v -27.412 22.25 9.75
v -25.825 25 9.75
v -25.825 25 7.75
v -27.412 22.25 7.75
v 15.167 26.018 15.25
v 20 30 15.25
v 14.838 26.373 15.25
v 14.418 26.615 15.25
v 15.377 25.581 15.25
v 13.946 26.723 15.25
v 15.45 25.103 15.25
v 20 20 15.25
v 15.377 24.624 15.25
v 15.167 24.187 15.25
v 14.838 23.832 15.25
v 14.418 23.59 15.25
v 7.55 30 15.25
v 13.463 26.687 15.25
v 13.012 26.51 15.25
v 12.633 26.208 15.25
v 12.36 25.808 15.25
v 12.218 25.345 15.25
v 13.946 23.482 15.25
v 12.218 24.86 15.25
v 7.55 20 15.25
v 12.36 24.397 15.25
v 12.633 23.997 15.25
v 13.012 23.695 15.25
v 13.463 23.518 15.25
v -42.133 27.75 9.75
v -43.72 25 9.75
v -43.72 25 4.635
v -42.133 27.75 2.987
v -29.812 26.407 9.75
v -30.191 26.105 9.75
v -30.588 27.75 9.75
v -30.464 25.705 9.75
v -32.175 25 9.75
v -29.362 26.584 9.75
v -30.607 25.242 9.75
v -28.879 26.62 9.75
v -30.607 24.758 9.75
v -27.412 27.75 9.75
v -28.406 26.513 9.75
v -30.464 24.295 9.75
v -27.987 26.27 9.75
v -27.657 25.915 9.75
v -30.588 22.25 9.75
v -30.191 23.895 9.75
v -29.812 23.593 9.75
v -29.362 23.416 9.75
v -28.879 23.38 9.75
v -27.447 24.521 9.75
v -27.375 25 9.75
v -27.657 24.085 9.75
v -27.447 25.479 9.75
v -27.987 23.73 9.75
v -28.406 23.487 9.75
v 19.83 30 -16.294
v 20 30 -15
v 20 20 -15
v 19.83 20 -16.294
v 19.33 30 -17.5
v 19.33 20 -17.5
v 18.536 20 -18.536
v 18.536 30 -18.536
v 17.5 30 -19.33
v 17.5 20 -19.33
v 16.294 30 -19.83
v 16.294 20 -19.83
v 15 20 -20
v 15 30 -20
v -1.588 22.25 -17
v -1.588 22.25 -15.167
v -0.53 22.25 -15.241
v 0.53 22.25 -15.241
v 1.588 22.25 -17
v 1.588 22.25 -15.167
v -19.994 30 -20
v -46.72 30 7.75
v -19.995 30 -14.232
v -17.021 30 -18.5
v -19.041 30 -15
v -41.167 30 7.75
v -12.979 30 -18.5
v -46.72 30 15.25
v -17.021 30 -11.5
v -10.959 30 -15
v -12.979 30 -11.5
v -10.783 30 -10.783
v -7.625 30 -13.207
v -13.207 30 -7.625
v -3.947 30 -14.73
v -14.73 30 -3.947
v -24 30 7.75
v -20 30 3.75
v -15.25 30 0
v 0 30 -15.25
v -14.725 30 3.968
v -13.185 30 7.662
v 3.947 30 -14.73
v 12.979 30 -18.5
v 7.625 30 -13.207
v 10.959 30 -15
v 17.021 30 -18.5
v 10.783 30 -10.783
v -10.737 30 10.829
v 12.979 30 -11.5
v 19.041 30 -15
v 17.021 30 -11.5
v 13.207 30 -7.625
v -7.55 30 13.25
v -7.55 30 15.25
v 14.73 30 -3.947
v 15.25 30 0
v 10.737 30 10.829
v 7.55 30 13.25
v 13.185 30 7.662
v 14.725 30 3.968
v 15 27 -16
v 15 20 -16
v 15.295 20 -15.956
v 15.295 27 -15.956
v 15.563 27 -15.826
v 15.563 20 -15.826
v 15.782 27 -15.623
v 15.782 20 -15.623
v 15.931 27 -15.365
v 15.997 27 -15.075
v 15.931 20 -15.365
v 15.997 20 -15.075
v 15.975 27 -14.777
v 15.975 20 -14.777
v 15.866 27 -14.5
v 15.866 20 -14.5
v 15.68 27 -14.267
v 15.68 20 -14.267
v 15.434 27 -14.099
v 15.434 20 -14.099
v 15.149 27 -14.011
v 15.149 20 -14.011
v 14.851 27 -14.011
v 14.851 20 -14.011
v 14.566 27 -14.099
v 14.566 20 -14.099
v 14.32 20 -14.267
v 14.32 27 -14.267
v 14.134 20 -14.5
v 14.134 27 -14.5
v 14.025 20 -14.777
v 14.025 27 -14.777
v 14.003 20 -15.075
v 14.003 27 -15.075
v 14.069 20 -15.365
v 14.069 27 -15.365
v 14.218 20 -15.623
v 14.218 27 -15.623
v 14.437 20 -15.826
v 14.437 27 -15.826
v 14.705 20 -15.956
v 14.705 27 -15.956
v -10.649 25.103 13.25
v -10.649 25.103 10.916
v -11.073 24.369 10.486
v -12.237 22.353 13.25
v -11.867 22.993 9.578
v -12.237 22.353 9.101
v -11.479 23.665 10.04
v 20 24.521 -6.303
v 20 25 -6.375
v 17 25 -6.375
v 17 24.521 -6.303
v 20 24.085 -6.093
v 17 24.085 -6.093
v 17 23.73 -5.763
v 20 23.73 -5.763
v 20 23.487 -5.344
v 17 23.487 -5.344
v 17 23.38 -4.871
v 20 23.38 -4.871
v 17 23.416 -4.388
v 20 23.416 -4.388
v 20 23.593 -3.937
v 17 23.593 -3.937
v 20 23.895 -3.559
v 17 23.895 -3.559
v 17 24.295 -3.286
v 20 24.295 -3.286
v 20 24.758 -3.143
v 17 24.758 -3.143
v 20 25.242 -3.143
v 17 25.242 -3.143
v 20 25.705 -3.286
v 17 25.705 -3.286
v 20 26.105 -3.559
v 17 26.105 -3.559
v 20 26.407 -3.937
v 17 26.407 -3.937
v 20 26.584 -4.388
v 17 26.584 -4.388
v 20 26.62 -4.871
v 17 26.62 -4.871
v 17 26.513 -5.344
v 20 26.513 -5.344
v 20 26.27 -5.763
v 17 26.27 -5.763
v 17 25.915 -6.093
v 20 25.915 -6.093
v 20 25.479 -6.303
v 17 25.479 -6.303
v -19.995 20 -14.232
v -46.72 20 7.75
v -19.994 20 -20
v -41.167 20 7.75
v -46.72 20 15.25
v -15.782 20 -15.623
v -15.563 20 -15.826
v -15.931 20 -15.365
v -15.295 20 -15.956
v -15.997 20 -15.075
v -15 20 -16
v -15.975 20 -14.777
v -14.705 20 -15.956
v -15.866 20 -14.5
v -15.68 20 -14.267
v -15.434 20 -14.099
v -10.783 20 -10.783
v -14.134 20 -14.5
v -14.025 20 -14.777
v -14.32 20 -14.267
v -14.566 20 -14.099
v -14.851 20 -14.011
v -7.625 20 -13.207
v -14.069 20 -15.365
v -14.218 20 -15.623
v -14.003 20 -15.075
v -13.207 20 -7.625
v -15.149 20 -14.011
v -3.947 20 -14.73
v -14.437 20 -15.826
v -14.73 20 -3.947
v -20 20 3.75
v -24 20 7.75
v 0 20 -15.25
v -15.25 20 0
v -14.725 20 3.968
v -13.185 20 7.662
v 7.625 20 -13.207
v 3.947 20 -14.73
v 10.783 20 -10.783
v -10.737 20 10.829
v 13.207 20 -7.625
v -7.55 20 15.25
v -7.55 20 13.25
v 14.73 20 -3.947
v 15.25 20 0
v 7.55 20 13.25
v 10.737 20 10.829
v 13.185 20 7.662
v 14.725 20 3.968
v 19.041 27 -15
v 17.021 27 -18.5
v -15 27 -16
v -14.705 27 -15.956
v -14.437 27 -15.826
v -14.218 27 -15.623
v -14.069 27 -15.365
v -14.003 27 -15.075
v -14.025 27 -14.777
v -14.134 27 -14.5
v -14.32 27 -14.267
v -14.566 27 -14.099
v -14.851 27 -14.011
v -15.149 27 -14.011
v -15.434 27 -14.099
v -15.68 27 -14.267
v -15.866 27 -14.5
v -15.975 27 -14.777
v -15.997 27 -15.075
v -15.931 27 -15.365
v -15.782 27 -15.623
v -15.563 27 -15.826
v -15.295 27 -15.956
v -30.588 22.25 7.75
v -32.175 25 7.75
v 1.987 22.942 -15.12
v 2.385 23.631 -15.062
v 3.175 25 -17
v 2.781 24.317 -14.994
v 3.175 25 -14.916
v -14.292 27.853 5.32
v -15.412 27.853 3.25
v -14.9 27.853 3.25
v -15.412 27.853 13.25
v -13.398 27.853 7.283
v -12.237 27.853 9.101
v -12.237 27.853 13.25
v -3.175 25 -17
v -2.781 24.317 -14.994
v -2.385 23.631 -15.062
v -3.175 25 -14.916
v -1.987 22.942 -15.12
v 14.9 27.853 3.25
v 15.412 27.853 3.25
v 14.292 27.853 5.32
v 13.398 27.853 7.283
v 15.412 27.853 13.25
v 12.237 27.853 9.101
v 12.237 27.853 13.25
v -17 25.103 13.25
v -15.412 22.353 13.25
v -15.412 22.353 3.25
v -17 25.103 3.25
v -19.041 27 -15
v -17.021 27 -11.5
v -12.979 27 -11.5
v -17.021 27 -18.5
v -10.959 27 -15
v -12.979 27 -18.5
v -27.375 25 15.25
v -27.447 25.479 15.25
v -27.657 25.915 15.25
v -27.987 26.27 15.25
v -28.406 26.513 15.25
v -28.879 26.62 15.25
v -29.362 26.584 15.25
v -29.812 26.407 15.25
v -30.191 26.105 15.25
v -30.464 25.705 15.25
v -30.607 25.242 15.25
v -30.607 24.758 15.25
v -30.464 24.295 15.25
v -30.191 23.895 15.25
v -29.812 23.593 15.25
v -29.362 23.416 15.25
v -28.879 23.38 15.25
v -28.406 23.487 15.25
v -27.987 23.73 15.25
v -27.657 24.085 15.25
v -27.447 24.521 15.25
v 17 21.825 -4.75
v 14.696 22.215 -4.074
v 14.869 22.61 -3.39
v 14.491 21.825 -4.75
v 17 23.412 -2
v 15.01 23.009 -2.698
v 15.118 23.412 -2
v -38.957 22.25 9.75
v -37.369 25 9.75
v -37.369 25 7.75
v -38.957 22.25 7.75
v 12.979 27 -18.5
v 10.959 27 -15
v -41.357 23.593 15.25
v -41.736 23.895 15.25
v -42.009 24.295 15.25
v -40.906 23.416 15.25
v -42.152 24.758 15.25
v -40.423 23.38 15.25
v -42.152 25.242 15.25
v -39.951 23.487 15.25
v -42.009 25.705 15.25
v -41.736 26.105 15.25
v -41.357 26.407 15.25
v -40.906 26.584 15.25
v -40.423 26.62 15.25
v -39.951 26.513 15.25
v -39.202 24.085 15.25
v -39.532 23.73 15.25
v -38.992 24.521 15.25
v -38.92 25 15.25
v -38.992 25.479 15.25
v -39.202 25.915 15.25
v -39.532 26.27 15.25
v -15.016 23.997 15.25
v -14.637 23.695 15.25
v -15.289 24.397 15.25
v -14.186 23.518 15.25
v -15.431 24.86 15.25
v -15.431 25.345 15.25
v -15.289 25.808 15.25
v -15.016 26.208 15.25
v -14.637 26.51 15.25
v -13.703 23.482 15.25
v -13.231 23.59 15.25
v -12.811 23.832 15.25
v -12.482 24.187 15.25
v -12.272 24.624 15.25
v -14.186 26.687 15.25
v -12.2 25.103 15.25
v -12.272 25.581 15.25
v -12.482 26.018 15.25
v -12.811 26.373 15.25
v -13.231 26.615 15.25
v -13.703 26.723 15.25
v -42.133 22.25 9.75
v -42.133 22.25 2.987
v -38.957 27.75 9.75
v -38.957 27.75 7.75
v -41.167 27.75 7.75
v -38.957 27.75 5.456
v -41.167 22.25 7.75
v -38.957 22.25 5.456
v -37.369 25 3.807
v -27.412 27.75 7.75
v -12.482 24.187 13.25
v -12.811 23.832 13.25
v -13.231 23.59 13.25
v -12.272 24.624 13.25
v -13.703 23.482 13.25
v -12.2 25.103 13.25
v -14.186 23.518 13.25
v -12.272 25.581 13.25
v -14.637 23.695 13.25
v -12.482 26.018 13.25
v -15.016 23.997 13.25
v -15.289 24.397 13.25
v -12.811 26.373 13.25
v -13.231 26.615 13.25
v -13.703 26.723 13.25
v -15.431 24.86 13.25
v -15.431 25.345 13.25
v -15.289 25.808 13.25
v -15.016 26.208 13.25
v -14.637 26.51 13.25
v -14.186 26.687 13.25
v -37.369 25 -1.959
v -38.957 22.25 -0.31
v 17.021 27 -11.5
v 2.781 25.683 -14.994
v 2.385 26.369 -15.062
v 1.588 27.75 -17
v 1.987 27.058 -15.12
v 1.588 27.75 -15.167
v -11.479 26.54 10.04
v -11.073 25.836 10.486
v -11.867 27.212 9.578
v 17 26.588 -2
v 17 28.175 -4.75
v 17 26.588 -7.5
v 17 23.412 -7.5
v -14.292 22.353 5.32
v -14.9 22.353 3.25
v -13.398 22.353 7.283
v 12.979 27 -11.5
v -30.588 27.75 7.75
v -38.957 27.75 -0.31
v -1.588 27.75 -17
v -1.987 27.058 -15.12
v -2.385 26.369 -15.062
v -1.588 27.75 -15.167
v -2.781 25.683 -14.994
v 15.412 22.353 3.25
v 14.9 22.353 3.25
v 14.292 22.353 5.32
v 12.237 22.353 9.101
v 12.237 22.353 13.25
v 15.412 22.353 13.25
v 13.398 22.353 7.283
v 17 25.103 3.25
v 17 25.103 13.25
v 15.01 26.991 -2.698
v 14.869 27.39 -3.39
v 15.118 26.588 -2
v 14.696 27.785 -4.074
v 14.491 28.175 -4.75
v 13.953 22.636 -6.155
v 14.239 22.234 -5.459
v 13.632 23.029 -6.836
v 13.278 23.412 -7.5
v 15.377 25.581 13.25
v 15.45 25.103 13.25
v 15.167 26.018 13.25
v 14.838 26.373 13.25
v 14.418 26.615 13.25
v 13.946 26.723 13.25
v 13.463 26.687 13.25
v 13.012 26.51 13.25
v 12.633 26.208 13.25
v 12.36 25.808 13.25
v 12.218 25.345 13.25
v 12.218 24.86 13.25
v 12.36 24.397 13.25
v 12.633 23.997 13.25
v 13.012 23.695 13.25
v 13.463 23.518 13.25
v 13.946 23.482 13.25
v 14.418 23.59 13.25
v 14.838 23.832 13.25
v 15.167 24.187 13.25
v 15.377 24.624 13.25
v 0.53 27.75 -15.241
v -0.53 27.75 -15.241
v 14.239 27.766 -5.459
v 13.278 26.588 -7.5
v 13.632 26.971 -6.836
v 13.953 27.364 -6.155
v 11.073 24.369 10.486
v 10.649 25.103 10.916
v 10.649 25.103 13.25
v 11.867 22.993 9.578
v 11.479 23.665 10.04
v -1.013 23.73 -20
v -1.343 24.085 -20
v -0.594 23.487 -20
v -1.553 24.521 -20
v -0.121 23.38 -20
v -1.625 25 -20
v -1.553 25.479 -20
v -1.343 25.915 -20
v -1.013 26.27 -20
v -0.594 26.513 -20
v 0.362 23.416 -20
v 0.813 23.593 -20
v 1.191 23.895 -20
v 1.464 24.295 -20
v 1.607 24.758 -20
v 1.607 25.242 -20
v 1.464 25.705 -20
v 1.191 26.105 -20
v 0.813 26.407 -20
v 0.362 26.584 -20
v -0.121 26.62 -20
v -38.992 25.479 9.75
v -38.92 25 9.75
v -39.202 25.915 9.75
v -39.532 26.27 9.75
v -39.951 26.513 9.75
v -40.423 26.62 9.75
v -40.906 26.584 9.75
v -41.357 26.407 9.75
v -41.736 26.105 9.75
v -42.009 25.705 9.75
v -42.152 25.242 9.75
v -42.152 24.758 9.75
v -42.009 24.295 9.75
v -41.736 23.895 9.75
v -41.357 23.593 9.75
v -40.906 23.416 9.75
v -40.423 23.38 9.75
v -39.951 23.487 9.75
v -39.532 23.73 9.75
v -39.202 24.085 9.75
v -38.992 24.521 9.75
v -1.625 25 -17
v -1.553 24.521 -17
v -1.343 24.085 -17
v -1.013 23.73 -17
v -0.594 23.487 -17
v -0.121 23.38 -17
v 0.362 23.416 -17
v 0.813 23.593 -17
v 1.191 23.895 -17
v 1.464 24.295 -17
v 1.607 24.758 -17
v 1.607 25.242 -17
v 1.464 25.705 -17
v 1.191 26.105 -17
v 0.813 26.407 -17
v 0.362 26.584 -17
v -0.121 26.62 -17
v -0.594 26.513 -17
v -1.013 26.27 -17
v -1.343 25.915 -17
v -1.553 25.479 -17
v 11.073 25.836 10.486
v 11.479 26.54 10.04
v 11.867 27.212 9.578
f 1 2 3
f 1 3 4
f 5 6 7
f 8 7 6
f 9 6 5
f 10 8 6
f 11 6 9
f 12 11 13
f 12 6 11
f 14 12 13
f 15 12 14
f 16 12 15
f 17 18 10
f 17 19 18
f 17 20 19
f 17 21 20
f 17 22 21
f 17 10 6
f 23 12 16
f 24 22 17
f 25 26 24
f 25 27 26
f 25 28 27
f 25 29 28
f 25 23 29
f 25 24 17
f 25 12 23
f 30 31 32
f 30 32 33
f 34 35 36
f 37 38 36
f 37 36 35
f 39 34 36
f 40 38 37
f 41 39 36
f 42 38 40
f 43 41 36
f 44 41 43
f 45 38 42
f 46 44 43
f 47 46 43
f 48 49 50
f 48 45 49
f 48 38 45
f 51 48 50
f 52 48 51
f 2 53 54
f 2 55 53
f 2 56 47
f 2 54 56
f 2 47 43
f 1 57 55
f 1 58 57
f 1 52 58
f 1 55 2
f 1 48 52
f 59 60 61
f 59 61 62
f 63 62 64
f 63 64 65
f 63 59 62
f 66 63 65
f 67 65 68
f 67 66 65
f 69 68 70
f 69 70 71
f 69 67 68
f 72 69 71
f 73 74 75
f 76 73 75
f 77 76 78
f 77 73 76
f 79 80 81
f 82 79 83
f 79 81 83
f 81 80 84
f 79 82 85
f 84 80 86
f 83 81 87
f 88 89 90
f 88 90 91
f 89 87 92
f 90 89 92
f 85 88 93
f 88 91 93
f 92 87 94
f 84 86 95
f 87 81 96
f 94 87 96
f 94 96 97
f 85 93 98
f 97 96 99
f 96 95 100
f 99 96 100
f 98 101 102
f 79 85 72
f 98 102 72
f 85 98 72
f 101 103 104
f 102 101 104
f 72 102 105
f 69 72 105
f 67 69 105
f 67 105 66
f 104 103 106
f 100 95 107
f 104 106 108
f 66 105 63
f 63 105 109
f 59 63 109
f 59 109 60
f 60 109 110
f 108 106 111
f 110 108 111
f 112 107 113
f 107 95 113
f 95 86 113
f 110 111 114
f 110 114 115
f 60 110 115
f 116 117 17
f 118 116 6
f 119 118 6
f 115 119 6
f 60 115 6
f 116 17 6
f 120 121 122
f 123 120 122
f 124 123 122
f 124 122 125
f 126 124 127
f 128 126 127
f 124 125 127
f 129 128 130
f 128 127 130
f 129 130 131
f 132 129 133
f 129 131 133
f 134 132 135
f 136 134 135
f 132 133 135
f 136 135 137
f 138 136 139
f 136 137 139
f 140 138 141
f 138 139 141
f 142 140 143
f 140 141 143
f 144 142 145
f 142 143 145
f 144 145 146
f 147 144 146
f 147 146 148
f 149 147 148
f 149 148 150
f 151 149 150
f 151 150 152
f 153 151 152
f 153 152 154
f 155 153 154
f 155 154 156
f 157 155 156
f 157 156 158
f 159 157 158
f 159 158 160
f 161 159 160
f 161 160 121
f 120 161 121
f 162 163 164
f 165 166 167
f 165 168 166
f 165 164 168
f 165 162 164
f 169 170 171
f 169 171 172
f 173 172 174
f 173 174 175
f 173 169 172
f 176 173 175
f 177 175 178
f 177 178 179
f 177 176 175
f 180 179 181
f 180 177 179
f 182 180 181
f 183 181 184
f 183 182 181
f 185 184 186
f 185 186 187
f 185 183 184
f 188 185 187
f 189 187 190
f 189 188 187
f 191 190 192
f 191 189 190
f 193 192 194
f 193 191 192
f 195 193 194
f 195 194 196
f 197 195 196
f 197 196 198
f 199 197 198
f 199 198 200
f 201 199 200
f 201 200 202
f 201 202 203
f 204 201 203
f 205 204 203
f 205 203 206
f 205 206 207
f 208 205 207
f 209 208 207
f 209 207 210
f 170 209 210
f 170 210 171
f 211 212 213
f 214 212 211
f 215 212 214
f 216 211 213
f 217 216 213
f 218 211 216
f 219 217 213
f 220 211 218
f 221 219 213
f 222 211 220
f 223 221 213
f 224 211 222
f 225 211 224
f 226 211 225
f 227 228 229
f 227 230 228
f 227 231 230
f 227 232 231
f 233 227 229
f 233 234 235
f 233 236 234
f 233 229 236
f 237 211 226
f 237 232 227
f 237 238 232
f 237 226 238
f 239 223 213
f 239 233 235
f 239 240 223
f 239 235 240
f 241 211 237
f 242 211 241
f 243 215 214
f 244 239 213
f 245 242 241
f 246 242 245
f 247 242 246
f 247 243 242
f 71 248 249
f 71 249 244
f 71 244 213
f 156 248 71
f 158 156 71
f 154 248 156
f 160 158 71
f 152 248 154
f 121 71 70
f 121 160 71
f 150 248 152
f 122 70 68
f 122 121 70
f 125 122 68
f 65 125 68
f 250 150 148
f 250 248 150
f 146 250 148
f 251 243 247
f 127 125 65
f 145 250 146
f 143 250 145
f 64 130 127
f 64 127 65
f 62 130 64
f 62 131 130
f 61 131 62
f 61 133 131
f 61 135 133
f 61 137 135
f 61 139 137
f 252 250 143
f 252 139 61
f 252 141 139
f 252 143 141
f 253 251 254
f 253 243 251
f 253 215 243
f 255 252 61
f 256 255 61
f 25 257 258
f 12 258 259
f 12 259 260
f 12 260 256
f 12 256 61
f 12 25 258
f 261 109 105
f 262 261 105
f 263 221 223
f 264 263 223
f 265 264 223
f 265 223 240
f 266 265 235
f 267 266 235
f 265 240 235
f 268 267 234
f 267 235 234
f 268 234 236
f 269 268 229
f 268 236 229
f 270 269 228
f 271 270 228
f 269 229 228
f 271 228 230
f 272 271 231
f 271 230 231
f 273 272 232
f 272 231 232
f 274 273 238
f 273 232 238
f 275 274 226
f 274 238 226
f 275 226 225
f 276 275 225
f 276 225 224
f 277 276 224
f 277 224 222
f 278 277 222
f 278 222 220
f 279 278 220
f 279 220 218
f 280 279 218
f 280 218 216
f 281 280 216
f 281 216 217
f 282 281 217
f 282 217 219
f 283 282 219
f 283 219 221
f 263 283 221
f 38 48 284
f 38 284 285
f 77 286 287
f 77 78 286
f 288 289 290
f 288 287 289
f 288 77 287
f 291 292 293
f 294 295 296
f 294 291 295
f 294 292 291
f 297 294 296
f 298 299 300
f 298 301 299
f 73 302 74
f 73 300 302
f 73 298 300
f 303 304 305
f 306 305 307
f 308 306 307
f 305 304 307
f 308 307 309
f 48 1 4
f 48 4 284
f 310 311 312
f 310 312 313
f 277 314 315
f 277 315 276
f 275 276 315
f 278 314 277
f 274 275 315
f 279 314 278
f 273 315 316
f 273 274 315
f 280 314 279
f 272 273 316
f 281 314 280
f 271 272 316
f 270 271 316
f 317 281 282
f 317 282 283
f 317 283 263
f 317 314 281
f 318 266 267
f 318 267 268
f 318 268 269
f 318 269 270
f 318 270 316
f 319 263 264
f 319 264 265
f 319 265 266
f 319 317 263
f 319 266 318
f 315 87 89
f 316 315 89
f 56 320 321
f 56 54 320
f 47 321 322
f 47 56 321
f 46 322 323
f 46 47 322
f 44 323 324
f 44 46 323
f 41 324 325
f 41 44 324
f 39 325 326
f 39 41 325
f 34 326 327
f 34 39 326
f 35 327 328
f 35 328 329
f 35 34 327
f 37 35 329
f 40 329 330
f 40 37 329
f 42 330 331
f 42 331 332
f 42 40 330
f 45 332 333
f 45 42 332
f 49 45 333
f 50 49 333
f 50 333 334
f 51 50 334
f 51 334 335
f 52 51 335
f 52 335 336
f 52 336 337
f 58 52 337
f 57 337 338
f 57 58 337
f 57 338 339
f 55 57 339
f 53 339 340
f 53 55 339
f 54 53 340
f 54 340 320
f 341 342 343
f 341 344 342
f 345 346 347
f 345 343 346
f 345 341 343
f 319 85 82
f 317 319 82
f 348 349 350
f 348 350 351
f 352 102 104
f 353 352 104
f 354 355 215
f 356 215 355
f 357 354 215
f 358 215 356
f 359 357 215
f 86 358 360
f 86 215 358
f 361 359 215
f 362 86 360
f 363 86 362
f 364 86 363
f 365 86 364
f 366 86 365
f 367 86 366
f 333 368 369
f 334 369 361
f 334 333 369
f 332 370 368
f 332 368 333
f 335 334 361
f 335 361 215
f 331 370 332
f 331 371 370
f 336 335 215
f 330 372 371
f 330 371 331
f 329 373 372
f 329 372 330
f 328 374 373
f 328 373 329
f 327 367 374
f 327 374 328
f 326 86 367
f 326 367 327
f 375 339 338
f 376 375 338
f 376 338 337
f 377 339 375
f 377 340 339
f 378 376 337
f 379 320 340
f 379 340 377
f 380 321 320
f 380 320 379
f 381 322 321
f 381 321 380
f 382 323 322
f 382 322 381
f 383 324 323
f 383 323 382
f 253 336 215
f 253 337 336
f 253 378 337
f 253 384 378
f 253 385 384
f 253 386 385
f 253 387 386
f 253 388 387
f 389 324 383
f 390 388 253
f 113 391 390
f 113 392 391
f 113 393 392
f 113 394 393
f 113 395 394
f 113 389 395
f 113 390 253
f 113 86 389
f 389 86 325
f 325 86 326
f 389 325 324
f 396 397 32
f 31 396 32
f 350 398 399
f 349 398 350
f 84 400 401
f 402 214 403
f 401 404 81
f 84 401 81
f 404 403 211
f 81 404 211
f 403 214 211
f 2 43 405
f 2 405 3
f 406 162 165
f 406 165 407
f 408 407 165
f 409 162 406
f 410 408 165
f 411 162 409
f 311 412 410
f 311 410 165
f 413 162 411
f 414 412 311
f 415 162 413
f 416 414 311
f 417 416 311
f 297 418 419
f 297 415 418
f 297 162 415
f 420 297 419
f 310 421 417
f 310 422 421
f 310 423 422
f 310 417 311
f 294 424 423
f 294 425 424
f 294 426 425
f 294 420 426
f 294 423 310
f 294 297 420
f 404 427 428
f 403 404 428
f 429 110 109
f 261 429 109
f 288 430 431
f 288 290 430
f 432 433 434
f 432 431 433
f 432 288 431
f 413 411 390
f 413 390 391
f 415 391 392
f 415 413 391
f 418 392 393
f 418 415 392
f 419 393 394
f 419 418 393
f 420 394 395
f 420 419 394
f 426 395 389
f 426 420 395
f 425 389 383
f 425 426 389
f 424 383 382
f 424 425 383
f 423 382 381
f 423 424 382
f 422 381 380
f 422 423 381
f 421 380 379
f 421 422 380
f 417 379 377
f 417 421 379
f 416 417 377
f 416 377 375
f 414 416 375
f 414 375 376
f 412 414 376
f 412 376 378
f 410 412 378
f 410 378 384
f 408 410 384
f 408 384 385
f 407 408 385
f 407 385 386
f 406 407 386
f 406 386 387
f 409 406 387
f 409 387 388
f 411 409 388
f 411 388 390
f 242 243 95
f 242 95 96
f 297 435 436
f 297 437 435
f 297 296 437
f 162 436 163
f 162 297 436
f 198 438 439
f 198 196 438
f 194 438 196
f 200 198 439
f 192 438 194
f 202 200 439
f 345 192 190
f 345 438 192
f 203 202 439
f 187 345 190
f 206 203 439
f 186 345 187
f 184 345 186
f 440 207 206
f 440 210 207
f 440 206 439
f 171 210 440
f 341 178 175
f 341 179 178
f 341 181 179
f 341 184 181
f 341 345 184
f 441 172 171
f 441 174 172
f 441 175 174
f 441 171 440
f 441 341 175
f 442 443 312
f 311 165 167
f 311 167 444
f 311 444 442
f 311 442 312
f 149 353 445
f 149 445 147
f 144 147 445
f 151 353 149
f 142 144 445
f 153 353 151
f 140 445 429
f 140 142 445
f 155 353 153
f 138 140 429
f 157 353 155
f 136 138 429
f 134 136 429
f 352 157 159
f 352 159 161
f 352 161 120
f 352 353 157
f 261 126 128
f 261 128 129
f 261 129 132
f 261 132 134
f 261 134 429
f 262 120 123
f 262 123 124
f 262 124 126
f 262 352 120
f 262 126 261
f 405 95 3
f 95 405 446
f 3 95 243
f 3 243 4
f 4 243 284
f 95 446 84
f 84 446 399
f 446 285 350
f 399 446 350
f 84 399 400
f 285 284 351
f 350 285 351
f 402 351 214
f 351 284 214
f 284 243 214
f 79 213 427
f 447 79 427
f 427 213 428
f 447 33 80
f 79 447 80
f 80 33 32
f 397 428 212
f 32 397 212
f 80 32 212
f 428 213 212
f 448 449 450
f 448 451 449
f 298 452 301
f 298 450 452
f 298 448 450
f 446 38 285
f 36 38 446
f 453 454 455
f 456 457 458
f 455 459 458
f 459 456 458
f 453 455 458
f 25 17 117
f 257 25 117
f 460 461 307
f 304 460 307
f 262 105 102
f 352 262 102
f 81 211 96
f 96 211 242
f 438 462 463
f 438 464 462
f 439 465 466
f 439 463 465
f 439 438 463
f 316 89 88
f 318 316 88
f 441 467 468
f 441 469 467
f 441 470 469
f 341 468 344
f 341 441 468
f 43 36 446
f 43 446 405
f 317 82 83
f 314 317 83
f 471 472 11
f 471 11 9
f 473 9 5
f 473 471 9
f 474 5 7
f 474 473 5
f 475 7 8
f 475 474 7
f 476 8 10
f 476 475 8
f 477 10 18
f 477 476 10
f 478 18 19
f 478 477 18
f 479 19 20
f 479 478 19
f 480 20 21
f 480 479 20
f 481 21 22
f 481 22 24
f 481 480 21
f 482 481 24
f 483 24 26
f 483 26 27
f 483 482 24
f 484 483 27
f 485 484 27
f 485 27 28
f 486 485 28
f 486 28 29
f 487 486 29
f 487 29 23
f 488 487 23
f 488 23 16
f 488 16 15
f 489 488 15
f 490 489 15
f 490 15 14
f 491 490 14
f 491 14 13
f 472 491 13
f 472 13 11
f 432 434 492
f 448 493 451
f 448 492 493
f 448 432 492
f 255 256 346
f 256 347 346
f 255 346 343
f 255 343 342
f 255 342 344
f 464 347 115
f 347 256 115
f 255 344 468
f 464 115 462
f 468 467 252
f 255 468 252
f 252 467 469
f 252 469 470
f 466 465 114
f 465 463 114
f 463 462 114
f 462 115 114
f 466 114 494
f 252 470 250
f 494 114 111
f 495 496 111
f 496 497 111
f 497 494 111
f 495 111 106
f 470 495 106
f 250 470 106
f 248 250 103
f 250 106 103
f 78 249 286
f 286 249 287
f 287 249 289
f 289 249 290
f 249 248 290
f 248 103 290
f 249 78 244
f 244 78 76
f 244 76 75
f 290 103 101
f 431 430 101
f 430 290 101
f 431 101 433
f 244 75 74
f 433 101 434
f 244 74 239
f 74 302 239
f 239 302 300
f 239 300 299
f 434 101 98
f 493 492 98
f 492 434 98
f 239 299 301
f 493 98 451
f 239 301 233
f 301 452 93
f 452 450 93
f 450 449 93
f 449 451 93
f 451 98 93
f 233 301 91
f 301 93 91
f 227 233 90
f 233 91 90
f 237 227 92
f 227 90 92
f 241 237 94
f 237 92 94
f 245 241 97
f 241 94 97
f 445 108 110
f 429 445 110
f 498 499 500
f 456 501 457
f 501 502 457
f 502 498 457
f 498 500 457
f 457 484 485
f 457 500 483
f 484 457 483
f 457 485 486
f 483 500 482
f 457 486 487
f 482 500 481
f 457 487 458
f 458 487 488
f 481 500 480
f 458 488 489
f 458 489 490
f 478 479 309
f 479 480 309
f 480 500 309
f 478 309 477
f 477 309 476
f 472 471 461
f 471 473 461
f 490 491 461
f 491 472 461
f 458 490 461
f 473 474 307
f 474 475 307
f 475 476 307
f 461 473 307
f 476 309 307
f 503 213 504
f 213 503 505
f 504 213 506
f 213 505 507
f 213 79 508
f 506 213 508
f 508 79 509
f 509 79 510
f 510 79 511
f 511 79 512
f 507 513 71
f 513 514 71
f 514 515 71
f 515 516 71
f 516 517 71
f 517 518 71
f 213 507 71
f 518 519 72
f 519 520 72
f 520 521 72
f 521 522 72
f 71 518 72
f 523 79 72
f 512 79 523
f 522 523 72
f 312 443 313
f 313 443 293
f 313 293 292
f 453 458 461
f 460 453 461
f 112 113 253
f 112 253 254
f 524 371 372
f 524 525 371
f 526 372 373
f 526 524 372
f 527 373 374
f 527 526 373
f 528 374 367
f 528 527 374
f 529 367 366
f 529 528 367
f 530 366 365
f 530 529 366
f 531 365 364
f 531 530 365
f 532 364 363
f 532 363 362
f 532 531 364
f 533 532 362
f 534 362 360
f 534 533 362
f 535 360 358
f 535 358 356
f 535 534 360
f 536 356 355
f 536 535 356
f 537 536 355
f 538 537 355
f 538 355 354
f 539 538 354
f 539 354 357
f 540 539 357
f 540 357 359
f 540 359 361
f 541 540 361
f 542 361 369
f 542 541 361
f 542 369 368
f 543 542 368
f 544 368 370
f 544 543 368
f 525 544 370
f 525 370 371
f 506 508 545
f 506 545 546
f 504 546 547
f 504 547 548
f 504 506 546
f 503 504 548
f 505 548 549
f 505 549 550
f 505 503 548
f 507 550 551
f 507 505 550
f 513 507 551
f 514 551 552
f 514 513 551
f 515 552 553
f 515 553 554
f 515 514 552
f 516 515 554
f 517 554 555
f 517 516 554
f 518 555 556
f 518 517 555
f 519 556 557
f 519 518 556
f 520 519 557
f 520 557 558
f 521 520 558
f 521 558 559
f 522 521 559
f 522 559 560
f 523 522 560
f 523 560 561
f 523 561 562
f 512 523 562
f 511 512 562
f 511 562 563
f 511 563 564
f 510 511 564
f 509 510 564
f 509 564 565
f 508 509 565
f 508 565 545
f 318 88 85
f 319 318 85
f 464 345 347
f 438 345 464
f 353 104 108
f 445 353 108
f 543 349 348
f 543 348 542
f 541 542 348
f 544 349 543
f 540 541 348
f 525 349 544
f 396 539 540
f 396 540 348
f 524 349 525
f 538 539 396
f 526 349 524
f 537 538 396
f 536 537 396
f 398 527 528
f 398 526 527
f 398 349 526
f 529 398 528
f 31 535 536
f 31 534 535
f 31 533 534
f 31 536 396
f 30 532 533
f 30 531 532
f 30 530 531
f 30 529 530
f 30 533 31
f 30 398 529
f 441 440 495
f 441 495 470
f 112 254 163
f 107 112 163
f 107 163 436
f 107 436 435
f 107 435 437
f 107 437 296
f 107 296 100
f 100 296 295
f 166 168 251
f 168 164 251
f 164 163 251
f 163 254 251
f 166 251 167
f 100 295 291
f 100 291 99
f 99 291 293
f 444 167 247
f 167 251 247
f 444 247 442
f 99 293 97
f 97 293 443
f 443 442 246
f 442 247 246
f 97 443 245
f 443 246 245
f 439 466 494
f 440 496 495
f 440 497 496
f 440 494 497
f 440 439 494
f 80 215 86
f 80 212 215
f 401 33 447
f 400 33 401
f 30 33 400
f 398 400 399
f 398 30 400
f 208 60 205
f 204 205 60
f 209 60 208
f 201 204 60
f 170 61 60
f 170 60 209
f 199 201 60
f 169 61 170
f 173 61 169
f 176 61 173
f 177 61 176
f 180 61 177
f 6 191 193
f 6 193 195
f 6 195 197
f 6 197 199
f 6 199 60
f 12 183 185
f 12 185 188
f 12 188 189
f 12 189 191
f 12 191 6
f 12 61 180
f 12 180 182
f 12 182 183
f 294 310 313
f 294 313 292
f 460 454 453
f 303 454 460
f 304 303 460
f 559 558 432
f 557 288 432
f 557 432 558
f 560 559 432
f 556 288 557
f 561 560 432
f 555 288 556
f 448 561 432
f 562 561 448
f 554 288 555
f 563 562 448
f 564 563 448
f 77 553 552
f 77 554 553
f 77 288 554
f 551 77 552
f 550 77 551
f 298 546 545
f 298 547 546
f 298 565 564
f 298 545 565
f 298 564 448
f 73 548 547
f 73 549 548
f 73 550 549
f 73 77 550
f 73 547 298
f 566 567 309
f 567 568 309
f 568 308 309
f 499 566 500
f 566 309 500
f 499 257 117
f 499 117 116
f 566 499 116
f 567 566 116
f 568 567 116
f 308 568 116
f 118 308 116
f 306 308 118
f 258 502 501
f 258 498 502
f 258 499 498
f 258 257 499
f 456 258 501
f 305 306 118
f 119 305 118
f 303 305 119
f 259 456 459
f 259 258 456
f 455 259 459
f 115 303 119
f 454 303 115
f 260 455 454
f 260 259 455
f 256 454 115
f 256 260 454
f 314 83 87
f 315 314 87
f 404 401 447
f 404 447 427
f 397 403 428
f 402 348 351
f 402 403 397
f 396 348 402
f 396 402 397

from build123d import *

# Parameters (mm, degrees)
CROQUIS1_R                              = 15.25
CROQUIS1_R_2                            = 2.125
SOPORTE_CAJA_REDUCTORA_DEPTH            = 20
CROQUIS3_R                              = 2.125
CORTAR_EXTRUIR1_DEPTH                   = 51.423828692
REDONDEO1_R                             = 5
BOSS_EXTRUDE1_DEPTH                     = 20
CUT_EXTRUDE1_REACH                      = 55.852
SKETCH2_R                               = 1.625
CUT_EXTRUDE2_DEPTH                      = 2
SKETCH4_R                               = 1.625
CUT_EXTRUDE3_DEPTH                      = 63.291652731
CUT_EXTRUDE4_START                      = -4.5
CUT_EXTRUDE4_DEPTH                      = 2
CROQUIS6_W                              = 4.75
CROQUIS6_H                              = 4.75
CORTAR_EXTRUIR17_DEPTH                  = 42.231056256
CROQUIS7_W                              = 60
CROQUIS7_H                              = 20
CORTAR_EXTRUIR18_DEPTH                  = 51.423828692
SALIENTE_EXTRUIR2_DEPTH                 = 49
SOPORTE_START                           = -15
SOPORTE_MOTOR_DEPTH                     = 15
CROQUIS12_R                             = 2.125
AGUJEROS_DE_SUJECION_A_BASE_DEPTH       = 84.087679592
TUERCA_START                            = -4
TUERCA_AGUJERO_DE_SUJECION_A_BASE_DEPTH = 10
SALIENTE_EXTRUIR4_DEPTH                 = 15
CORTAR_EXTRUIR19_DEPTH                  = 25
CROQUIS14_W                             = 50
CROQUIS14_H                             = 118
CORTAR_EXTRUIR22_DEPTH                  = 146.556045907
CROQUIS15_W                             = 10
CROQUIS15_H                             = 7
CORTAR_EXTRUIR23_DEPTH                  = 42.231056256
CORTAR_EXTRUIR24_DEPTH                  = 42.231056256
CROQUIS18_W                             = 40
CROQUIS18_H                             = 10
CORTAR_EXTRUIR25_DEPTH                  = 44.27311521
SALIENTE_EXTRUIR5_DEPTH                 = 10
CROQUIS20_R                             = 1
CORTAR_EXTRUIR26_DEPTH                  = 49.229270158
CORTAR_EXTRUIR27_REACH                  = 62.959
CORTAR_EXTRUIR27_END_RADIUS             = 15.25
CROQUIS21_R                             = 1.625
CROQUIS22_R                             = 2.125
CROQUIS22_R_2                           = 1
SALIENTE_EXTRUIR6_DEPTH                 = 10
CROQUIS23_R                             = 1.625
CORTAR_EXTRUIR28_DEPTH                  = 52.269508521
CORTAR_EXTRUIR29_START                  = -3
CORTAR_EXTRUIR29_DEPTH                  = 10
SALIENTE_EXTRUIR7_DEPTH                 = 10
CORTAR_EXTRUIR30_REACH                  = 72.235
CROQUIS27_R                             = 1.625
CORTAR_EXTRUIR31_REACH                  = 75.235
CORTAR_EXTRUIR31_START                  = -3
CORTAR_EXTRUIR32_REACH                  = 58.612
CROQUIS29_R                             = 1.625
CORTAR_EXTRUIR33_REACH                  = 61.112
CORTAR_EXTRUIR33_START                  = -2.5
CROQUIS35_W                             = 13.305418987
CROQUIS35_H                             = 6.826864192
CORTAR_EXTRUIR34_DEPTH                  = 63.931555098
CORTAR_EXTRUIR34_DEPTH_BACK             = 63.931555098
CORTAR_EXTRUIR35_START                  = -3
CORTAR_EXTRUIR35_DEPTH                  = 10
SALIENTE_EXTRUIR8_DEPTH                 = 10
SALIENTE_EXTRUIR9_DEPTH                 = 13
SALIENTE_EXTRUIR10_DEPTH                = 3
CROQUIS40_W                             = 106.583537839
CROQUIS40_H                             = 47.391515964
CORTAR_EXTRUIR36_DEPTH                  = 80.887064817
CORTAR_EXTRUIR36_DEPTH_BACK             = 80.887064817
CORTAR_EXTRUIR37_DEPTH                  = 67.2524009
CORTAR_EXTRUIR37_DEPTH_BACK             = 67.2524009
CORTAR_EXTRUIR38_DEPTH                  = 79.704784639
CORTAR_EXTRUIR38_DEPTH_BACK             = 79.704784639
SALIENTE_EXTRUIR11_DEPTH                = 10
CORTAR_EXTRUIR39_DEPTH                  = 63.9908649
CROQUIS45_W                             = 31.470301378
CROQUIS45_H                             = 10
CROQUIS45_R                             = 1.625
SALIENTE_EXTRUIR12_DEPTH                = 2.5
SALIENTE_EXTRUIR13_DEPTH                = 10
CORTAR_EXTRUIR40_START                  = -2
CROQUIS47_R                             = 1.625
CORTAR_EXTRUIR40_DEPTH                  = 10
CORTAR_EXTRUIR41_START                  = -12
CROQUIS48_R                             = 1.625
CORTAR_EXTRUIR41_DEPTH                  = 12
CORTAR_EXTRUIR42_DEPTH                  = 3


with BuildPart() as part:
    # Croquis1 → Soporte caja reductora (new body)
    with BuildSketch(Plane(origin=(0, 0, 0), x_dir=(1, 0, 0), z_dir=(0, 1, 0))):
        Polygon((-30, -15.25), (-20, -15.25), (-20, -20), (20, -20), (20, -15.25), (30, -15.25), (30, -7.25), (20, -4.25), (20, 20), (-20, 20), (-20, -4.25), (-30, -7.25), align=None)
        with Locations(Location((0, 0, 0), (0, 0, 270))):
            Circle(CROQUIS1_R, mode=Mode.SUBTRACT)
        with Locations(Location((-15, 15, 0), (0, 0, 270))):
            Circle(CROQUIS1_R_2, mode=Mode.SUBTRACT)
        with Locations(Location((15, 15, 0), (0, 0, 270))):
            Circle(CROQUIS1_R_2, mode=Mode.SUBTRACT)
    extrude(amount=-SOPORTE_CAJA_REDUCTORA_DEPTH)

    # Croquis3 → Cortar-Extruir1 (cut, through all)
    with BuildSketch(Plane.XY.offset(15.25)):
        with Locations((-23.5, -10)):
            Circle(CROQUIS3_R)
        with Locations((23.5, -10)):
            Circle(CROQUIS3_R)
    extrude(amount=-CORTAR_EXTRUIR1_DEPTH, mode=Mode.SUBTRACT)

    # Redondeo1
    redondeo1_edges = [part.edges().sort_by_distance(p)[0] for p in [
        (-20, -10, -20),
        (20, -10, -20),
    ]]
    fillet(redondeo1_edges, radius=REDONDEO1_R)

    # Sketch1 → Boss-Extrude1 (add)
    with BuildSketch(Plane(origin=(0, 0, 0), x_dir=(1, 0, 0), z_dir=(0, 1, 0))):
        with BuildLine():
            Line((25.5, 15), (20, 15))
            ThreePointArc((20, 15), (18.535533906, 18.535533906), (15, 20))
            Line((15, 20), (30, 20))
            Line((30, 20), (30, 8))
            Line((30, 8), (25.5, 8))
            Line((25.5, 8), (25.5, 15))
        make_face()
    extrude(amount=-BOSS_EXTRUDE1_DEPTH)

    # Sketch2 → Cut-Extrude1 (cut, up to next)
    with BuildSketch(Plane(origin=(0, 0, -20), x_dir=(-1, 0, 0), z_dir=(0, 0, -1)), mode=Mode.PRIVATE) as cut_extrude1_sk1:
        with Locations((-22.75, -10)):
            Circle(SKETCH2_R)
    cut_extrude1_tool1 = extrude(cut_extrude1_sk1.sketch, amount=-CUT_EXTRUDE1_REACH, mode=Mode.PRIVATE) & part.part
    add(cut_extrude1_tool1.solids().sort_by_distance((22.75, -10, -20))[0], mode=Mode.SUBTRACT)

    # Sketch3 → Cut-Extrude2 (cut)
    with BuildSketch(Plane.XY.offset(-15)):
        Polygon((20, -11.58771324), (22.75, -13.175426481), (25.5, -11.58771324), (25.5, -8.41228676), (22.75, -6.824573519), (20, -8.41228676), align=None)
    extrude(amount=-CUT_EXTRUDE2_DEPTH, mode=Mode.SUBTRACT)

    # Sketch4 → Cut-Extrude3 (cut, through all)
    with BuildSketch(Plane.ZY.offset(-25.5)):
        with Locations((-12.25, -10)):
            Circle(SKETCH4_R)
    extrude(amount=-CUT_EXTRUDE3_DEPTH, mode=Mode.SUBTRACT)

    # Sketch5 → Cut-Extrude4 (cut)
    with BuildSketch(Plane(origin=(30, 0, 0), x_dir=(0, 0, -1), z_dir=(1, 0, 0)).offset(CUT_EXTRUDE4_START)):
        Polygon((15, -11.58771324), (15, -8.41228676), (12.25, -6.824573519), (9.5, -8.41228676), (9.5, -11.58771324), (12.25, -13.175426481), align=None)
    extrude(amount=CUT_EXTRUDE4_DEPTH, mode=Mode.SUBTRACT)

    # Croquis6 → Cortar-Extruir17 (cut, through all)
    with BuildSketch(Plane(origin=(0, 0, 0), x_dir=(1, 0, 0), z_dir=(0, 1, 0))):
        Polygon((0, -15.25), (-15.25, -15.25), (-15.25, -20), (15.25, -20), (15.25, -15.25), align=None)
        with Locations((-17.625, -17.625)):
            Rectangle(CROQUIS6_W, CROQUIS6_H)
        with BuildLine():
            ThreePointArc((0, -15.25), (-10.783378413, -10.783378413), (-15.25, 0))
            Line((-15.25, 0), (-15.25, -15.25))
            Line((-15.25, -15.25), (0, -15.25))
        make_face()
        with BuildLine():
            Line((15.25, -15.25), (15.25, 0))
            ThreePointArc((15.25, 0), (10.783378413, -10.783378413), (0, -15.25))
            Line((0, -15.25), (15.25, -15.25))
        make_face()
        with Locations((17.625, -17.625)):
            Rectangle(CROQUIS6_W, CROQUIS6_H)
    extrude(amount=-CORTAR_EXTRUIR17_DEPTH, mode=Mode.SUBTRACT)


with BuildPart() as body_2:
    # Simetría1: mirrored copy
    add(part.part.mirror(Plane.ZX))

    # Croquis8 → Saliente-Extruir2 (add)
    with BuildSketch(Plane(origin=(0, 20, 0), x_dir=(1, 0, 0), z_dir=(0, 1, 0))):
        with BuildLine():
            Line((-12.664515522, 20), (-11.040489496, 13.939052358))
            Line((-11.040489496, 13.939052358), (-10.315162126, 11.232093763))
            ThreePointArc((-10.315162126, 11.232093763), (0, 15.25), (10.315162126, 11.232093763))
            Line((10.315162126, 11.232093763), (10.817418481, 13.87928066))
            Line((10.817418481, 13.87928066), (11.978715476, 20))
            Line((11.978715476, 20), (-12.664515522, 20))
        make_face()
    extrude(amount=SALIENTE_EXTRUIR2_DEPTH)

    # Croquis9 → Soporte motor (add)
    with BuildSketch(Plane(origin=(0, 69, 0), x_dir=(1, 0, 0), z_dir=(0, 1, 0)).offset(SOPORTE_START)):
        with BuildLine():
            Line((-20, 15), (-20, -4.25))
            Line((-20, -4.25), (-30, -7.25))
            Line((-30, -7.25), (-30, -15.25))
            Line((-30, -15.25), (0, -15.25))
            Line((0, -15.25), (0, -14.75))
            ThreePointArc((0, -14.75), (-10.429825023, 10.429825023), (14.75, 0))
            Line((14.75, 0), (20, 0))
            Line((20, 0), (20, 13.936837101))
            Line((20, 13.936837101), (12.664515522, 20))
            Line((12.664515522, 20), (-15, 20))
            ThreePointArc((-15, 20), (-18.535533906, 18.535533906), (-20, 15))
        make_face()
    extrude(amount=-SOPORTE_MOTOR_DEPTH)

    # Croquis12 → Agujeros de sujecion a base (cut, through all)
    with BuildSketch(Plane.XY.offset(15.25)):
        with Locations((-23.5, 46.5)):
            Circle(CROQUIS12_R)
    extrude(amount=-AGUJEROS_DE_SUJECION_A_BASE_DEPTH, mode=Mode.SUBTRACT)

    # Croquis13 → Tuerca Agujero de sujecion a base (cut)
    with BuildSketch(Plane.XY.offset(15.25).offset(TUERCA_START)):
        Polygon((-20, 44.479274058), (-20, 48.520725942), (-23.5, 50.541451884), (-27, 48.520725942), (-27, 44.479274058), (-23.5, 42.458548116), align=None)
    extrude(amount=-TUERCA_AGUJERO_DE_SUJECION_A_BASE_DEPTH, mode=Mode.SUBTRACT)

    # Croquis10 → Saliente-Extruir4 (add)
    with BuildSketch(Plane(origin=(0, 69, 0), x_dir=(1, 0, 0), z_dir=(0, 1, 0))):
        with BuildLine():
            ThreePointArc((10.315162126, 11.232093763), (0, 15.25), (-10.315162126, 11.232093763))
            Line((-10.315162126, 11.232093763), (-10.16850369, 10.684757026))
            ThreePointArc((-10.16850369, 10.684757026), (0, 14.75), (10.16850369, 10.684757026))
            Line((10.16850369, 10.684757026), (10.315162126, 11.232093763))
        make_face()
    extrude(amount=-SALIENTE_EXTRUIR4_DEPTH)

    # Croquis11 → Cortar-Extruir19 (cut)
    with BuildSketch(Plane.XZ):
        with BuildLine():
            Line((15.25, 4.25), (20, 4.25))
            Line((20, 4.25), (21.972856468, 4.84185694))
            ThreePointArc((21.972856468, 4.84185694), (19.948931102, 10.40625523), (16.543503257, 15.25))
            Line((16.543503257, 15.25), (15.25, 15.25))
            Line((15.25, 15.25), (15.25, 4.25))
        make_face()
        with BuildLine():
            Line((21.972856468, 4.84185694), (30, 7.25))
            Line((30, 7.25), (30, 15.25))
            Line((30, 15.25), (16.543503257, 15.25))
            ThreePointArc((16.543503257, 15.25), (19.948931102, 10.40625523), (21.972856468, 4.84185694))
        make_face()
        with BuildLine():
            ThreePointArc((20, -15), (18.535533906, -18.535533906), (15, -20))
            Line((15, -20), (30, -20))
            Line((30, -20), (30, -8))
            Line((30, -8), (25.5, -8))
            Line((25.5, -8), (25.5, -15))
            Line((25.5, -15), (20, -15))
        make_face()
    extrude(amount=-CORTAR_EXTRUIR19_DEPTH, mode=Mode.SUBTRACT)

    # Simetría2: body 2 across face


with BuildPart() as part_1:
    add(part.part)

    # Croquis7 → Cortar-Extruir18 (cut, through all)
    with BuildSketch(Plane(origin=(0, 0, -20), x_dir=(-1, 0, 0), z_dir=(0, 0, -1))):
        with Locations((0, -10)):
            Rectangle(CROQUIS7_W, CROQUIS7_H)
    extrude(amount=-CORTAR_EXTRUIR18_DEPTH, mode=Mode.SUBTRACT)


with BuildPart() as body_2_1:
    add(body_2.part)
    add(body_2.part.mirror(Plane(origin=(-0.229209569, 69, -16.663998028), x_dir=(0, 0, 1), z_dir=(0, 1, 0))))

    # Croquis14 → Cortar-Extruir22 (cut, through all)
    with BuildSketch(Plane.XY.offset(15.25)):
        with Locations((-5, 79)):
            Rectangle(CROQUIS14_W, CROQUIS14_H)
    extrude(amount=-CORTAR_EXTRUIR22_DEPTH, mode=Mode.SUBTRACT)

    # Croquis15 → Cortar-Extruir23 (cut, through all)
    with BuildSketch(Plane.XZ):
        with Locations((-25, 7.75)):
            Rectangle(CROQUIS15_W, CROQUIS15_H)
    extrude(amount=-CORTAR_EXTRUIR23_DEPTH, mode=Mode.SUBTRACT)

    # Croquis16 → Cortar-Extruir24 (cut, through all)
    with BuildSketch(Plane.XZ):
        Polygon((-30, 15.25), (-15.25, 15.25), (-15.25, 12.75), (-20, 12.75), (-20, 11.25), (-30, 11.25), (-30, 12.75), align=None)
    extrude(amount=-CORTAR_EXTRUIR24_DEPTH, mode=Mode.SUBTRACT)

    # Croquis18 → Cortar-Extruir25 (cut, through all)
    with BuildSketch(Plane(origin=(0, 0, -20), x_dir=(-1, 0, 0), z_dir=(0, 0, -1))):
        with Locations((0, 5)):
            Rectangle(CROQUIS18_W, CROQUIS18_H)
    extrude(amount=-CORTAR_EXTRUIR25_DEPTH, mode=Mode.SUBTRACT)

    # Croquis19 → Saliente-Extruir5 (add)
    with BuildSketch(Plane(origin=(0, 20, 0), x_dir=(1, 0, 0), z_dir=(0, 1, 0))):
        Polygon((-20, -12.75), (-34, -12.75), (-34, -7.75), (-24, -7.75), (-20, -3.75), align=None)
    extrude(amount=-SALIENTE_EXTRUIR5_DEPTH)

    # Croquis20 → Cortar-Extruir26 (cut, through all)
    with BuildSketch(Plane(origin=(0, 0, 7.75), x_dir=(-1, 0, 0), z_dir=(0, 0, -1))):
        with Locations((29, 15)):
            Circle(CROQUIS20_R)
    extrude(amount=-CORTAR_EXTRUIR26_DEPTH, mode=Mode.SUBTRACT)

    # Cortar-Extruir27: up to this cylinder (the profile starts outside it)
    cortar_extruir27_end = Plane(origin=(0, 15, 0), z_dir=(0, -1, 0)) * Cylinder(CORTAR_EXTRUIR27_END_RADIUS, 157.418, mode=Mode.PRIVATE)
    # Croquis21 → Cortar-Extruir27 (cut, up to the surface)
    with BuildSketch(Plane(origin=(20, 0, 0), x_dir=(0, 0, -1), z_dir=(1, 0, 0)), mode=Mode.PRIVATE) as cortar_extruir27_sk1:
        with Locations((4.75, 15)):
            Circle(CROQUIS21_R)
    cortar_extruir27_tool1 = extrude(cortar_extruir27_sk1.sketch, amount=-CORTAR_EXTRUIR27_REACH, mode=Mode.PRIVATE) - cortar_extruir27_end
    add(cortar_extruir27_tool1.solids().sort_by_distance((20, 15, -4.75))[0], mode=Mode.SUBTRACT)

    # Croquis22 → Saliente-Extruir6 (add)
    with BuildSketch(Plane.XZ.offset(-10)):
        with Locations((-15, -15)):
            Circle(CROQUIS22_R)
        with Locations(Location((-15, -15, 0), (0, 0, 270))):
            Circle(CROQUIS22_R_2, mode=Mode.SUBTRACT)
        with Locations((15, -15)):
            Circle(CROQUIS22_R)
        with Locations(Location((15, -15, 0), (0, 0, 270))):
            Circle(CROQUIS22_R_2, mode=Mode.SUBTRACT)
    extrude(amount=-SALIENTE_EXTRUIR6_DEPTH)

    # Croquis23 → Cortar-Extruir28 (cut, through all)
    with BuildSketch(Plane(origin=(0, 0, -20), x_dir=(-1, 0, 0), z_dir=(0, 0, -1))):
        with Locations((0, 15)):
            Circle(CROQUIS23_R)
    extrude(amount=-CORTAR_EXTRUIR28_DEPTH, mode=Mode.SUBTRACT)

    # Croquis24 → Cortar-Extruir29 (cut)
    with BuildSketch(Plane(origin=(0, 0, -20), x_dir=(-1, 0, 0), z_dir=(0, 0, -1)).offset(CORTAR_EXTRUIR29_START)):
        Polygon((1.58771324, 12.25), (3.175426481, 15), (1.58771324, 17.75), (-1.58771324, 17.75), (-3.175426481, 15), (-1.58771324, 12.25), align=None)
    extrude(amount=-CORTAR_EXTRUIR29_DEPTH, mode=Mode.SUBTRACT)

    # Croquis26 → Saliente-Extruir7 (add)
    with BuildSketch(Plane.XZ.offset(-10)):
        Polygon((-34, 7.75), (-34, 12.75), (-58.825, 12.75), (-39.160527763, -4.104491148), (-20, -4.104491148), (-20, -0.104491148), (-35.732113118, -0.104491148), (-29, 7.75), align=None)
        Polygon((-34.268209086, 7.75), (-39.594516123, 1.535690951), (-46.844874897, 7.75), align=None, mode=Mode.SUBTRACT)
    extrude(amount=-SALIENTE_EXTRUIR7_DEPTH)

    # Croquis27 → Cortar-Extruir30 (cut, up to next)
    with BuildSketch(Plane.XY.offset(12.75), mode=Mode.PRIVATE) as cortar_extruir30_sk1:
        with Locations((-40.544874897, 15)):
            Circle(CROQUIS27_R)
    cortar_extruir30_tool1 = extrude(cortar_extruir30_sk1.sketch, amount=-CORTAR_EXTRUIR30_REACH, mode=Mode.PRIVATE) & body_2_1.part
    # Croquis27 → Cortar-Extruir30 (cut, up to next)
    with BuildSketch(Plane.XY.offset(12.75), mode=Mode.PRIVATE) as cortar_extruir30_sk2:
        with Locations((-29, 15)):
            Circle(CROQUIS27_R)
    cortar_extruir30_tool2 = extrude(cortar_extruir30_sk2.sketch, amount=-CORTAR_EXTRUIR30_REACH, mode=Mode.PRIVATE) & body_2_1.part
    add(cortar_extruir30_tool1.solids().sort_by_distance((-40.544875, 15, 12.75))[0], mode=Mode.SUBTRACT)
    add(cortar_extruir30_tool2.solids().sort_by_distance((-29, 15, 12.75))[0], mode=Mode.SUBTRACT)

    # Croquis28 → Cortar-Extruir31 (cut, up to next)
    with BuildSketch(Plane.XY.offset(12.75).offset(CORTAR_EXTRUIR31_START), mode=Mode.PRIVATE) as cortar_extruir31_sk1:
        Polygon((-38.957161657, 12.25), (-37.369448416, 15), (-38.957161657, 17.75), (-42.132588137, 17.75), (-43.720301378, 15), (-42.132588137, 12.25), align=None)
    cortar_extruir31_tool1 = extrude(cortar_extruir31_sk1.sketch, amount=-CORTAR_EXTRUIR31_REACH, mode=Mode.PRIVATE) & body_2_1.part
    # Croquis28 → Cortar-Extruir31 (cut, up to next)
    with BuildSketch(Plane.XY.offset(12.75).offset(CORTAR_EXTRUIR31_START), mode=Mode.PRIVATE) as cortar_extruir31_sk2:
        Polygon((-27.41228676, 12.25), (-25.824573519, 15), (-27.41228676, 17.75), (-30.58771324, 17.75), (-32.175426481, 15), (-30.58771324, 12.25), align=None)
    cortar_extruir31_tool2 = extrude(cortar_extruir31_sk2.sketch, amount=-CORTAR_EXTRUIR31_REACH, mode=Mode.PRIVATE) & body_2_1.part
    add(cortar_extruir31_tool1.solids().sort_by_distance((-40.544875, 15, 9.75))[0], mode=Mode.SUBTRACT)
    add(cortar_extruir31_tool2.solids().sort_by_distance((-29, 15, 9.75))[0], mode=Mode.SUBTRACT)

    # Croquis29 → Cortar-Extruir32 (cut, up to next)
    with BuildSketch(Plane(origin=(-18.612848159, 0, -21.715982563), x_dir=(-0.7592713073348843, 0, 0.6507742172658468), z_dir=(-0.6507742172658468, 0, -0.7592713073348843)), mode=Mode.PRIVATE) as cortar_extruir32_sk1:
        with Locations((33.812368097, 15)):
            Circle(CROQUIS29_R)
    cortar_extruir32_tool1 = extrude(cortar_extruir32_sk1.sketch, amount=-CORTAR_EXTRUIR32_REACH, mode=Mode.PRIVATE) & body_2_1.part
    add(cortar_extruir32_tool1.solids().sort_by_distance((-44.285609, 15, 0.288235))[0], mode=Mode.SUBTRACT)

    # Croquis31 → Cortar-Extruir33 (cut, up to next)
    with BuildSketch(Plane(origin=(-18.612848159, 0, -21.715982563), x_dir=(-0.7592713073348843, 0, 0.6507742172658468), z_dir=(-0.6507742172658468, 0, -0.7592713073348843)).offset(CORTAR_EXTRUIR33_START), mode=Mode.PRIVATE) as cortar_extruir33_sk1:
        Polygon((36.562368097, 16.58771324), (33.812368097, 18.175426481), (31.062368097, 16.58771324), (31.062368097, 13.41228676), (33.812368097, 11.824573519), (36.562368097, 13.41228676), align=None)
    cortar_extruir33_tool1 = extrude(cortar_extruir33_sk1.sketch, amount=-CORTAR_EXTRUIR33_REACH, mode=Mode.PRIVATE) & body_2_1.part
    add(cortar_extruir33_tool1.solids().sort_by_distance((-42.658674, 15, 2.186413))[0], mode=Mode.SUBTRACT)

    # Croquis35 → Cortar-Extruir34 (cut, two sides)
    with BuildSketch(Plane(origin=(0, 20, 0), x_dir=(1, 0, 0), z_dir=(0, 1, 0))) as cortar_extruir34_sk:
        with Locations((17.04227466, -3.413432096)):
            Rectangle(CROQUIS35_W, CROQUIS35_H)
    extrude(amount=CORTAR_EXTRUIR34_DEPTH, mode=Mode.SUBTRACT)
    extrude(cortar_extruir34_sk.sketch, amount=-CORTAR_EXTRUIR34_DEPTH_BACK, mode=Mode.SUBTRACT)

    # Croquis36 → Cortar-Extruir35 (cut)
    with BuildSketch(Plane(origin=(20, 0, 0), x_dir=(0, 0, -1), z_dir=(1, 0, 0)).offset(CORTAR_EXTRUIR35_START)):
        Polygon((7.5, 16.58771324), (4.75, 18.175426481), (2, 16.58771324), (2, 13.41228676), (4.75, 11.824573519), (7.5, 13.41228676), align=None)
    extrude(amount=-CORTAR_EXTRUIR35_DEPTH, mode=Mode.SUBTRACT)

    # Croquis37 → Saliente-Extruir8 (add)
    with BuildSketch(Plane.XZ.offset(-10)):
        Polygon((-39.160527763, -4.104491148), (-20.614919368, -20), (-15, -20), (-19.558128305, -15.637570403), (-33.014002756, -4.104491148), align=None)
    extrude(amount=-SALIENTE_EXTRUIR8_DEPTH)

    # Croquis38 → Saliente-Extruir9 (add)
    with BuildSketch(Plane.XZ.offset(-10)):
        Polygon((-58.825, 12.75), (-38.825, 12.75), (-38.825, 9.75), (-55.324839942, 9.75), align=None)
    extrude(amount=SALIENTE_EXTRUIR9_DEPTH)

    # Croquis39 → Saliente-Extruir10 (add)
    with BuildSketch(Plane.XZ.offset(-10)):
        Polygon((-38.825, 9.75), (-38.825, 7.75), (-38.825, 5.75), (-50.657959865, 5.75), (-52.991399903, 7.75), (-55.324839942, 9.75), align=None)
    extrude(amount=SALIENTE_EXTRUIR10_DEPTH)

    # Simetría3: body 2 across face


with BuildPart() as body_2_2:
    add(body_2_1.part)
    add(body_2_1.part.mirror(Plane(origin=(-18.003999227, 20, -4.220503046), x_dir=(0, 0, 1), z_dir=(0, 1, 0))))

    # Croquis40 → Cortar-Extruir36 (cut, two sides)
    with BuildSketch(Plane(origin=(0, 0, -20), x_dir=(-1, 0, 0), z_dir=(0, 0, -1))) as cortar_extruir36_sk:
        with Locations((22.395502026, -3.695757982)):
            Rectangle(CROQUIS40_W, CROQUIS40_H)
    extrude(amount=CORTAR_EXTRUIR36_DEPTH, mode=Mode.SUBTRACT)
    extrude(cortar_extruir36_sk.sketch, amount=-CORTAR_EXTRUIR36_DEPTH_BACK, mode=Mode.SUBTRACT)

    # Croquis41 → Cortar-Extruir37 (cut, two sides)
    with BuildSketch(Plane.XZ.offset(-20)) as cortar_extruir37_sk:
        Polygon((-19.992980133, -22.302484261), (-20, 3.75), (-24, 7.75), (-56.035110209, 7.75), align=None)
    extrude(amount=CORTAR_EXTRUIR37_DEPTH, mode=Mode.SUBTRACT)
    extrude(cortar_extruir37_sk.sketch, amount=-CORTAR_EXTRUIR37_DEPTH_BACK, mode=Mode.SUBTRACT)

    # Croquis42 → Cortar-Extruir38 (cut, two sides)
    with BuildSketch(Plane(origin=(0, 0, 9.75), x_dir=(-1, 0, 0), z_dir=(0, 0, -1))) as cortar_extruir38_sk:
        Polygon((46.720301378, 20), (46.720301378, 30), (38.825, 30), (33.492952769, 43.760628779), (49.525340398, 48.951442806), (67.200390695, 42.512205152), (65.906601328, 20), (51.713995885, 13.864168239), align=None)
    extrude(amount=CORTAR_EXTRUIR38_DEPTH, mode=Mode.SUBTRACT)
    extrude(cortar_extruir38_sk.sketch, amount=-CORTAR_EXTRUIR38_DEPTH_BACK, mode=Mode.SUBTRACT)

    # Croquis43 → Saliente-Extruir11 (add)
    with BuildSketch(Plane.XZ.offset(-20)):
        Polygon((-19.993600539, -20), (-46.720301378, 7.75), (-43.839252857, 10.524807997), (-17.112552018, -17.225192003), align=None)
    extrude(amount=-SALIENTE_EXTRUIR11_DEPTH)

    # Croquis44 → Cortar-Extruir39 (cut, through all)
    with BuildSketch(Plane(origin=(0, 0, 9.75), x_dir=(-1, 0, 0), z_dir=(0, 0, -1))):
        Polygon((38.957161657, 27.75), (37.369448416, 25), (38.957161657, 22.25), (42.132588137, 22.25), (43.720301378, 25), (42.132588137, 27.75), align=None)
    extrude(amount=CORTAR_EXTRUIR39_DEPTH, mode=Mode.SUBTRACT)

    # Croquis45 → Saliente-Extruir12 (add)
    with BuildSketch(Plane.XY.offset(12.75)):
        with Locations((-30.985150689, 25)):
            Rectangle(CROQUIS45_W, CROQUIS45_H)
        with Locations((-40.544874897, 25)):
            Circle(CROQUIS45_R, mode=Mode.SUBTRACT)
        with Locations((-29, 25)):
            Circle(CROQUIS45_R, mode=Mode.SUBTRACT)
    extrude(amount=SALIENTE_EXTRUIR12_DEPTH)

    # Croquis46 → Saliente-Extruir13 (add)
    with BuildSketch(Plane.XZ.offset(-20)):
        with BuildLine():
            Line((15.25, 0), (20, 0))
            Line((20, 0), (20, 15.25))
            Line((20, 15.25), (7.549834435, 15.25))
            Line((7.549834435, 15.25), (7.549834435, 13.25))
            ThreePointArc((7.549834435, 13.25), (13.185171124, 7.662490615), (15.25, 0))
        make_face()
        with BuildLine():
            Line((-15.25, 0), (-15.25, 15.25))
            Line((-15.25, 15.25), (-7.549834435, 15.25))
            Line((-7.549834435, 15.25), (-7.549834435, 13.25))
            ThreePointArc((-7.549834435, 13.25), (-13.185171124, 7.662490615), (-15.25, 0))
        make_face()
    extrude(amount=-SALIENTE_EXTRUIR13_DEPTH)

    # Croquis47 → Cortar-Extruir40 (cut)
    with BuildSketch(Plane.XY.offset(15.25).offset(CORTAR_EXTRUIR40_START)):
        Polygon((15.41228676, 22.352505966), (17, 25.102505966), (15.41228676, 27.852505966), (12.236860279, 27.852505966), (10.649147039, 25.102505966), (12.236860279, 22.352505966), align=None)
        with Locations((13.824573519, 25.102505966)):
            Circle(CROQUIS47_R, mode=Mode.SUBTRACT)
        Polygon((-12.236860279, 22.352505966), (-15.41228676, 22.352505966), (-17, 25.102505966), (-15.41228676, 27.852505966), (-12.236860279, 27.852505966), (-10.649147039, 25.102505966), align=None)
        with Locations(Location((-13.824573519, 25.102505966, 0), (0, 0, 131.421584744))):
            Circle(CROQUIS47_R, mode=Mode.SUBTRACT)
    extrude(amount=-CORTAR_EXTRUIR40_DEPTH, mode=Mode.SUBTRACT)

    # Croquis48 → Cortar-Extruir41 (cut)
    with BuildSketch(Plane.XY.offset(15.25).offset(CORTAR_EXTRUIR41_START)):
        with Locations((13.824573519, 25.102505966)):
            Circle(CROQUIS48_R)
        with Locations((-13.824573519, 25.102505966)):
            Circle(CROQUIS48_R)
    extrude(amount=CORTAR_EXTRUIR41_DEPTH, mode=Mode.SUBTRACT)

    # Croquis49 → Cortar-Extruir42 (cut)
    with BuildSketch(Plane(origin=(0, 30, 0), x_dir=(1, 0, 0), z_dir=(0, 1, 0))):
        Polygon((-12.979274058, 11.5), (-10.958548116, 15), (-12.979274058, 18.5), (-17.020725942, 18.5), (-19.041451884, 15), (-17.020725942, 11.5), align=None)
        Polygon((17.020725942, 11.5), (19.041451884, 15), (17.020725942, 18.5), (12.979274058, 18.5), (10.958548116, 15), (12.979274058, 11.5), align=None)
    extrude(amount=-CORTAR_EXTRUIR42_DEPTH, mode=Mode.SUBTRACT)


solid = body_2_2.part
